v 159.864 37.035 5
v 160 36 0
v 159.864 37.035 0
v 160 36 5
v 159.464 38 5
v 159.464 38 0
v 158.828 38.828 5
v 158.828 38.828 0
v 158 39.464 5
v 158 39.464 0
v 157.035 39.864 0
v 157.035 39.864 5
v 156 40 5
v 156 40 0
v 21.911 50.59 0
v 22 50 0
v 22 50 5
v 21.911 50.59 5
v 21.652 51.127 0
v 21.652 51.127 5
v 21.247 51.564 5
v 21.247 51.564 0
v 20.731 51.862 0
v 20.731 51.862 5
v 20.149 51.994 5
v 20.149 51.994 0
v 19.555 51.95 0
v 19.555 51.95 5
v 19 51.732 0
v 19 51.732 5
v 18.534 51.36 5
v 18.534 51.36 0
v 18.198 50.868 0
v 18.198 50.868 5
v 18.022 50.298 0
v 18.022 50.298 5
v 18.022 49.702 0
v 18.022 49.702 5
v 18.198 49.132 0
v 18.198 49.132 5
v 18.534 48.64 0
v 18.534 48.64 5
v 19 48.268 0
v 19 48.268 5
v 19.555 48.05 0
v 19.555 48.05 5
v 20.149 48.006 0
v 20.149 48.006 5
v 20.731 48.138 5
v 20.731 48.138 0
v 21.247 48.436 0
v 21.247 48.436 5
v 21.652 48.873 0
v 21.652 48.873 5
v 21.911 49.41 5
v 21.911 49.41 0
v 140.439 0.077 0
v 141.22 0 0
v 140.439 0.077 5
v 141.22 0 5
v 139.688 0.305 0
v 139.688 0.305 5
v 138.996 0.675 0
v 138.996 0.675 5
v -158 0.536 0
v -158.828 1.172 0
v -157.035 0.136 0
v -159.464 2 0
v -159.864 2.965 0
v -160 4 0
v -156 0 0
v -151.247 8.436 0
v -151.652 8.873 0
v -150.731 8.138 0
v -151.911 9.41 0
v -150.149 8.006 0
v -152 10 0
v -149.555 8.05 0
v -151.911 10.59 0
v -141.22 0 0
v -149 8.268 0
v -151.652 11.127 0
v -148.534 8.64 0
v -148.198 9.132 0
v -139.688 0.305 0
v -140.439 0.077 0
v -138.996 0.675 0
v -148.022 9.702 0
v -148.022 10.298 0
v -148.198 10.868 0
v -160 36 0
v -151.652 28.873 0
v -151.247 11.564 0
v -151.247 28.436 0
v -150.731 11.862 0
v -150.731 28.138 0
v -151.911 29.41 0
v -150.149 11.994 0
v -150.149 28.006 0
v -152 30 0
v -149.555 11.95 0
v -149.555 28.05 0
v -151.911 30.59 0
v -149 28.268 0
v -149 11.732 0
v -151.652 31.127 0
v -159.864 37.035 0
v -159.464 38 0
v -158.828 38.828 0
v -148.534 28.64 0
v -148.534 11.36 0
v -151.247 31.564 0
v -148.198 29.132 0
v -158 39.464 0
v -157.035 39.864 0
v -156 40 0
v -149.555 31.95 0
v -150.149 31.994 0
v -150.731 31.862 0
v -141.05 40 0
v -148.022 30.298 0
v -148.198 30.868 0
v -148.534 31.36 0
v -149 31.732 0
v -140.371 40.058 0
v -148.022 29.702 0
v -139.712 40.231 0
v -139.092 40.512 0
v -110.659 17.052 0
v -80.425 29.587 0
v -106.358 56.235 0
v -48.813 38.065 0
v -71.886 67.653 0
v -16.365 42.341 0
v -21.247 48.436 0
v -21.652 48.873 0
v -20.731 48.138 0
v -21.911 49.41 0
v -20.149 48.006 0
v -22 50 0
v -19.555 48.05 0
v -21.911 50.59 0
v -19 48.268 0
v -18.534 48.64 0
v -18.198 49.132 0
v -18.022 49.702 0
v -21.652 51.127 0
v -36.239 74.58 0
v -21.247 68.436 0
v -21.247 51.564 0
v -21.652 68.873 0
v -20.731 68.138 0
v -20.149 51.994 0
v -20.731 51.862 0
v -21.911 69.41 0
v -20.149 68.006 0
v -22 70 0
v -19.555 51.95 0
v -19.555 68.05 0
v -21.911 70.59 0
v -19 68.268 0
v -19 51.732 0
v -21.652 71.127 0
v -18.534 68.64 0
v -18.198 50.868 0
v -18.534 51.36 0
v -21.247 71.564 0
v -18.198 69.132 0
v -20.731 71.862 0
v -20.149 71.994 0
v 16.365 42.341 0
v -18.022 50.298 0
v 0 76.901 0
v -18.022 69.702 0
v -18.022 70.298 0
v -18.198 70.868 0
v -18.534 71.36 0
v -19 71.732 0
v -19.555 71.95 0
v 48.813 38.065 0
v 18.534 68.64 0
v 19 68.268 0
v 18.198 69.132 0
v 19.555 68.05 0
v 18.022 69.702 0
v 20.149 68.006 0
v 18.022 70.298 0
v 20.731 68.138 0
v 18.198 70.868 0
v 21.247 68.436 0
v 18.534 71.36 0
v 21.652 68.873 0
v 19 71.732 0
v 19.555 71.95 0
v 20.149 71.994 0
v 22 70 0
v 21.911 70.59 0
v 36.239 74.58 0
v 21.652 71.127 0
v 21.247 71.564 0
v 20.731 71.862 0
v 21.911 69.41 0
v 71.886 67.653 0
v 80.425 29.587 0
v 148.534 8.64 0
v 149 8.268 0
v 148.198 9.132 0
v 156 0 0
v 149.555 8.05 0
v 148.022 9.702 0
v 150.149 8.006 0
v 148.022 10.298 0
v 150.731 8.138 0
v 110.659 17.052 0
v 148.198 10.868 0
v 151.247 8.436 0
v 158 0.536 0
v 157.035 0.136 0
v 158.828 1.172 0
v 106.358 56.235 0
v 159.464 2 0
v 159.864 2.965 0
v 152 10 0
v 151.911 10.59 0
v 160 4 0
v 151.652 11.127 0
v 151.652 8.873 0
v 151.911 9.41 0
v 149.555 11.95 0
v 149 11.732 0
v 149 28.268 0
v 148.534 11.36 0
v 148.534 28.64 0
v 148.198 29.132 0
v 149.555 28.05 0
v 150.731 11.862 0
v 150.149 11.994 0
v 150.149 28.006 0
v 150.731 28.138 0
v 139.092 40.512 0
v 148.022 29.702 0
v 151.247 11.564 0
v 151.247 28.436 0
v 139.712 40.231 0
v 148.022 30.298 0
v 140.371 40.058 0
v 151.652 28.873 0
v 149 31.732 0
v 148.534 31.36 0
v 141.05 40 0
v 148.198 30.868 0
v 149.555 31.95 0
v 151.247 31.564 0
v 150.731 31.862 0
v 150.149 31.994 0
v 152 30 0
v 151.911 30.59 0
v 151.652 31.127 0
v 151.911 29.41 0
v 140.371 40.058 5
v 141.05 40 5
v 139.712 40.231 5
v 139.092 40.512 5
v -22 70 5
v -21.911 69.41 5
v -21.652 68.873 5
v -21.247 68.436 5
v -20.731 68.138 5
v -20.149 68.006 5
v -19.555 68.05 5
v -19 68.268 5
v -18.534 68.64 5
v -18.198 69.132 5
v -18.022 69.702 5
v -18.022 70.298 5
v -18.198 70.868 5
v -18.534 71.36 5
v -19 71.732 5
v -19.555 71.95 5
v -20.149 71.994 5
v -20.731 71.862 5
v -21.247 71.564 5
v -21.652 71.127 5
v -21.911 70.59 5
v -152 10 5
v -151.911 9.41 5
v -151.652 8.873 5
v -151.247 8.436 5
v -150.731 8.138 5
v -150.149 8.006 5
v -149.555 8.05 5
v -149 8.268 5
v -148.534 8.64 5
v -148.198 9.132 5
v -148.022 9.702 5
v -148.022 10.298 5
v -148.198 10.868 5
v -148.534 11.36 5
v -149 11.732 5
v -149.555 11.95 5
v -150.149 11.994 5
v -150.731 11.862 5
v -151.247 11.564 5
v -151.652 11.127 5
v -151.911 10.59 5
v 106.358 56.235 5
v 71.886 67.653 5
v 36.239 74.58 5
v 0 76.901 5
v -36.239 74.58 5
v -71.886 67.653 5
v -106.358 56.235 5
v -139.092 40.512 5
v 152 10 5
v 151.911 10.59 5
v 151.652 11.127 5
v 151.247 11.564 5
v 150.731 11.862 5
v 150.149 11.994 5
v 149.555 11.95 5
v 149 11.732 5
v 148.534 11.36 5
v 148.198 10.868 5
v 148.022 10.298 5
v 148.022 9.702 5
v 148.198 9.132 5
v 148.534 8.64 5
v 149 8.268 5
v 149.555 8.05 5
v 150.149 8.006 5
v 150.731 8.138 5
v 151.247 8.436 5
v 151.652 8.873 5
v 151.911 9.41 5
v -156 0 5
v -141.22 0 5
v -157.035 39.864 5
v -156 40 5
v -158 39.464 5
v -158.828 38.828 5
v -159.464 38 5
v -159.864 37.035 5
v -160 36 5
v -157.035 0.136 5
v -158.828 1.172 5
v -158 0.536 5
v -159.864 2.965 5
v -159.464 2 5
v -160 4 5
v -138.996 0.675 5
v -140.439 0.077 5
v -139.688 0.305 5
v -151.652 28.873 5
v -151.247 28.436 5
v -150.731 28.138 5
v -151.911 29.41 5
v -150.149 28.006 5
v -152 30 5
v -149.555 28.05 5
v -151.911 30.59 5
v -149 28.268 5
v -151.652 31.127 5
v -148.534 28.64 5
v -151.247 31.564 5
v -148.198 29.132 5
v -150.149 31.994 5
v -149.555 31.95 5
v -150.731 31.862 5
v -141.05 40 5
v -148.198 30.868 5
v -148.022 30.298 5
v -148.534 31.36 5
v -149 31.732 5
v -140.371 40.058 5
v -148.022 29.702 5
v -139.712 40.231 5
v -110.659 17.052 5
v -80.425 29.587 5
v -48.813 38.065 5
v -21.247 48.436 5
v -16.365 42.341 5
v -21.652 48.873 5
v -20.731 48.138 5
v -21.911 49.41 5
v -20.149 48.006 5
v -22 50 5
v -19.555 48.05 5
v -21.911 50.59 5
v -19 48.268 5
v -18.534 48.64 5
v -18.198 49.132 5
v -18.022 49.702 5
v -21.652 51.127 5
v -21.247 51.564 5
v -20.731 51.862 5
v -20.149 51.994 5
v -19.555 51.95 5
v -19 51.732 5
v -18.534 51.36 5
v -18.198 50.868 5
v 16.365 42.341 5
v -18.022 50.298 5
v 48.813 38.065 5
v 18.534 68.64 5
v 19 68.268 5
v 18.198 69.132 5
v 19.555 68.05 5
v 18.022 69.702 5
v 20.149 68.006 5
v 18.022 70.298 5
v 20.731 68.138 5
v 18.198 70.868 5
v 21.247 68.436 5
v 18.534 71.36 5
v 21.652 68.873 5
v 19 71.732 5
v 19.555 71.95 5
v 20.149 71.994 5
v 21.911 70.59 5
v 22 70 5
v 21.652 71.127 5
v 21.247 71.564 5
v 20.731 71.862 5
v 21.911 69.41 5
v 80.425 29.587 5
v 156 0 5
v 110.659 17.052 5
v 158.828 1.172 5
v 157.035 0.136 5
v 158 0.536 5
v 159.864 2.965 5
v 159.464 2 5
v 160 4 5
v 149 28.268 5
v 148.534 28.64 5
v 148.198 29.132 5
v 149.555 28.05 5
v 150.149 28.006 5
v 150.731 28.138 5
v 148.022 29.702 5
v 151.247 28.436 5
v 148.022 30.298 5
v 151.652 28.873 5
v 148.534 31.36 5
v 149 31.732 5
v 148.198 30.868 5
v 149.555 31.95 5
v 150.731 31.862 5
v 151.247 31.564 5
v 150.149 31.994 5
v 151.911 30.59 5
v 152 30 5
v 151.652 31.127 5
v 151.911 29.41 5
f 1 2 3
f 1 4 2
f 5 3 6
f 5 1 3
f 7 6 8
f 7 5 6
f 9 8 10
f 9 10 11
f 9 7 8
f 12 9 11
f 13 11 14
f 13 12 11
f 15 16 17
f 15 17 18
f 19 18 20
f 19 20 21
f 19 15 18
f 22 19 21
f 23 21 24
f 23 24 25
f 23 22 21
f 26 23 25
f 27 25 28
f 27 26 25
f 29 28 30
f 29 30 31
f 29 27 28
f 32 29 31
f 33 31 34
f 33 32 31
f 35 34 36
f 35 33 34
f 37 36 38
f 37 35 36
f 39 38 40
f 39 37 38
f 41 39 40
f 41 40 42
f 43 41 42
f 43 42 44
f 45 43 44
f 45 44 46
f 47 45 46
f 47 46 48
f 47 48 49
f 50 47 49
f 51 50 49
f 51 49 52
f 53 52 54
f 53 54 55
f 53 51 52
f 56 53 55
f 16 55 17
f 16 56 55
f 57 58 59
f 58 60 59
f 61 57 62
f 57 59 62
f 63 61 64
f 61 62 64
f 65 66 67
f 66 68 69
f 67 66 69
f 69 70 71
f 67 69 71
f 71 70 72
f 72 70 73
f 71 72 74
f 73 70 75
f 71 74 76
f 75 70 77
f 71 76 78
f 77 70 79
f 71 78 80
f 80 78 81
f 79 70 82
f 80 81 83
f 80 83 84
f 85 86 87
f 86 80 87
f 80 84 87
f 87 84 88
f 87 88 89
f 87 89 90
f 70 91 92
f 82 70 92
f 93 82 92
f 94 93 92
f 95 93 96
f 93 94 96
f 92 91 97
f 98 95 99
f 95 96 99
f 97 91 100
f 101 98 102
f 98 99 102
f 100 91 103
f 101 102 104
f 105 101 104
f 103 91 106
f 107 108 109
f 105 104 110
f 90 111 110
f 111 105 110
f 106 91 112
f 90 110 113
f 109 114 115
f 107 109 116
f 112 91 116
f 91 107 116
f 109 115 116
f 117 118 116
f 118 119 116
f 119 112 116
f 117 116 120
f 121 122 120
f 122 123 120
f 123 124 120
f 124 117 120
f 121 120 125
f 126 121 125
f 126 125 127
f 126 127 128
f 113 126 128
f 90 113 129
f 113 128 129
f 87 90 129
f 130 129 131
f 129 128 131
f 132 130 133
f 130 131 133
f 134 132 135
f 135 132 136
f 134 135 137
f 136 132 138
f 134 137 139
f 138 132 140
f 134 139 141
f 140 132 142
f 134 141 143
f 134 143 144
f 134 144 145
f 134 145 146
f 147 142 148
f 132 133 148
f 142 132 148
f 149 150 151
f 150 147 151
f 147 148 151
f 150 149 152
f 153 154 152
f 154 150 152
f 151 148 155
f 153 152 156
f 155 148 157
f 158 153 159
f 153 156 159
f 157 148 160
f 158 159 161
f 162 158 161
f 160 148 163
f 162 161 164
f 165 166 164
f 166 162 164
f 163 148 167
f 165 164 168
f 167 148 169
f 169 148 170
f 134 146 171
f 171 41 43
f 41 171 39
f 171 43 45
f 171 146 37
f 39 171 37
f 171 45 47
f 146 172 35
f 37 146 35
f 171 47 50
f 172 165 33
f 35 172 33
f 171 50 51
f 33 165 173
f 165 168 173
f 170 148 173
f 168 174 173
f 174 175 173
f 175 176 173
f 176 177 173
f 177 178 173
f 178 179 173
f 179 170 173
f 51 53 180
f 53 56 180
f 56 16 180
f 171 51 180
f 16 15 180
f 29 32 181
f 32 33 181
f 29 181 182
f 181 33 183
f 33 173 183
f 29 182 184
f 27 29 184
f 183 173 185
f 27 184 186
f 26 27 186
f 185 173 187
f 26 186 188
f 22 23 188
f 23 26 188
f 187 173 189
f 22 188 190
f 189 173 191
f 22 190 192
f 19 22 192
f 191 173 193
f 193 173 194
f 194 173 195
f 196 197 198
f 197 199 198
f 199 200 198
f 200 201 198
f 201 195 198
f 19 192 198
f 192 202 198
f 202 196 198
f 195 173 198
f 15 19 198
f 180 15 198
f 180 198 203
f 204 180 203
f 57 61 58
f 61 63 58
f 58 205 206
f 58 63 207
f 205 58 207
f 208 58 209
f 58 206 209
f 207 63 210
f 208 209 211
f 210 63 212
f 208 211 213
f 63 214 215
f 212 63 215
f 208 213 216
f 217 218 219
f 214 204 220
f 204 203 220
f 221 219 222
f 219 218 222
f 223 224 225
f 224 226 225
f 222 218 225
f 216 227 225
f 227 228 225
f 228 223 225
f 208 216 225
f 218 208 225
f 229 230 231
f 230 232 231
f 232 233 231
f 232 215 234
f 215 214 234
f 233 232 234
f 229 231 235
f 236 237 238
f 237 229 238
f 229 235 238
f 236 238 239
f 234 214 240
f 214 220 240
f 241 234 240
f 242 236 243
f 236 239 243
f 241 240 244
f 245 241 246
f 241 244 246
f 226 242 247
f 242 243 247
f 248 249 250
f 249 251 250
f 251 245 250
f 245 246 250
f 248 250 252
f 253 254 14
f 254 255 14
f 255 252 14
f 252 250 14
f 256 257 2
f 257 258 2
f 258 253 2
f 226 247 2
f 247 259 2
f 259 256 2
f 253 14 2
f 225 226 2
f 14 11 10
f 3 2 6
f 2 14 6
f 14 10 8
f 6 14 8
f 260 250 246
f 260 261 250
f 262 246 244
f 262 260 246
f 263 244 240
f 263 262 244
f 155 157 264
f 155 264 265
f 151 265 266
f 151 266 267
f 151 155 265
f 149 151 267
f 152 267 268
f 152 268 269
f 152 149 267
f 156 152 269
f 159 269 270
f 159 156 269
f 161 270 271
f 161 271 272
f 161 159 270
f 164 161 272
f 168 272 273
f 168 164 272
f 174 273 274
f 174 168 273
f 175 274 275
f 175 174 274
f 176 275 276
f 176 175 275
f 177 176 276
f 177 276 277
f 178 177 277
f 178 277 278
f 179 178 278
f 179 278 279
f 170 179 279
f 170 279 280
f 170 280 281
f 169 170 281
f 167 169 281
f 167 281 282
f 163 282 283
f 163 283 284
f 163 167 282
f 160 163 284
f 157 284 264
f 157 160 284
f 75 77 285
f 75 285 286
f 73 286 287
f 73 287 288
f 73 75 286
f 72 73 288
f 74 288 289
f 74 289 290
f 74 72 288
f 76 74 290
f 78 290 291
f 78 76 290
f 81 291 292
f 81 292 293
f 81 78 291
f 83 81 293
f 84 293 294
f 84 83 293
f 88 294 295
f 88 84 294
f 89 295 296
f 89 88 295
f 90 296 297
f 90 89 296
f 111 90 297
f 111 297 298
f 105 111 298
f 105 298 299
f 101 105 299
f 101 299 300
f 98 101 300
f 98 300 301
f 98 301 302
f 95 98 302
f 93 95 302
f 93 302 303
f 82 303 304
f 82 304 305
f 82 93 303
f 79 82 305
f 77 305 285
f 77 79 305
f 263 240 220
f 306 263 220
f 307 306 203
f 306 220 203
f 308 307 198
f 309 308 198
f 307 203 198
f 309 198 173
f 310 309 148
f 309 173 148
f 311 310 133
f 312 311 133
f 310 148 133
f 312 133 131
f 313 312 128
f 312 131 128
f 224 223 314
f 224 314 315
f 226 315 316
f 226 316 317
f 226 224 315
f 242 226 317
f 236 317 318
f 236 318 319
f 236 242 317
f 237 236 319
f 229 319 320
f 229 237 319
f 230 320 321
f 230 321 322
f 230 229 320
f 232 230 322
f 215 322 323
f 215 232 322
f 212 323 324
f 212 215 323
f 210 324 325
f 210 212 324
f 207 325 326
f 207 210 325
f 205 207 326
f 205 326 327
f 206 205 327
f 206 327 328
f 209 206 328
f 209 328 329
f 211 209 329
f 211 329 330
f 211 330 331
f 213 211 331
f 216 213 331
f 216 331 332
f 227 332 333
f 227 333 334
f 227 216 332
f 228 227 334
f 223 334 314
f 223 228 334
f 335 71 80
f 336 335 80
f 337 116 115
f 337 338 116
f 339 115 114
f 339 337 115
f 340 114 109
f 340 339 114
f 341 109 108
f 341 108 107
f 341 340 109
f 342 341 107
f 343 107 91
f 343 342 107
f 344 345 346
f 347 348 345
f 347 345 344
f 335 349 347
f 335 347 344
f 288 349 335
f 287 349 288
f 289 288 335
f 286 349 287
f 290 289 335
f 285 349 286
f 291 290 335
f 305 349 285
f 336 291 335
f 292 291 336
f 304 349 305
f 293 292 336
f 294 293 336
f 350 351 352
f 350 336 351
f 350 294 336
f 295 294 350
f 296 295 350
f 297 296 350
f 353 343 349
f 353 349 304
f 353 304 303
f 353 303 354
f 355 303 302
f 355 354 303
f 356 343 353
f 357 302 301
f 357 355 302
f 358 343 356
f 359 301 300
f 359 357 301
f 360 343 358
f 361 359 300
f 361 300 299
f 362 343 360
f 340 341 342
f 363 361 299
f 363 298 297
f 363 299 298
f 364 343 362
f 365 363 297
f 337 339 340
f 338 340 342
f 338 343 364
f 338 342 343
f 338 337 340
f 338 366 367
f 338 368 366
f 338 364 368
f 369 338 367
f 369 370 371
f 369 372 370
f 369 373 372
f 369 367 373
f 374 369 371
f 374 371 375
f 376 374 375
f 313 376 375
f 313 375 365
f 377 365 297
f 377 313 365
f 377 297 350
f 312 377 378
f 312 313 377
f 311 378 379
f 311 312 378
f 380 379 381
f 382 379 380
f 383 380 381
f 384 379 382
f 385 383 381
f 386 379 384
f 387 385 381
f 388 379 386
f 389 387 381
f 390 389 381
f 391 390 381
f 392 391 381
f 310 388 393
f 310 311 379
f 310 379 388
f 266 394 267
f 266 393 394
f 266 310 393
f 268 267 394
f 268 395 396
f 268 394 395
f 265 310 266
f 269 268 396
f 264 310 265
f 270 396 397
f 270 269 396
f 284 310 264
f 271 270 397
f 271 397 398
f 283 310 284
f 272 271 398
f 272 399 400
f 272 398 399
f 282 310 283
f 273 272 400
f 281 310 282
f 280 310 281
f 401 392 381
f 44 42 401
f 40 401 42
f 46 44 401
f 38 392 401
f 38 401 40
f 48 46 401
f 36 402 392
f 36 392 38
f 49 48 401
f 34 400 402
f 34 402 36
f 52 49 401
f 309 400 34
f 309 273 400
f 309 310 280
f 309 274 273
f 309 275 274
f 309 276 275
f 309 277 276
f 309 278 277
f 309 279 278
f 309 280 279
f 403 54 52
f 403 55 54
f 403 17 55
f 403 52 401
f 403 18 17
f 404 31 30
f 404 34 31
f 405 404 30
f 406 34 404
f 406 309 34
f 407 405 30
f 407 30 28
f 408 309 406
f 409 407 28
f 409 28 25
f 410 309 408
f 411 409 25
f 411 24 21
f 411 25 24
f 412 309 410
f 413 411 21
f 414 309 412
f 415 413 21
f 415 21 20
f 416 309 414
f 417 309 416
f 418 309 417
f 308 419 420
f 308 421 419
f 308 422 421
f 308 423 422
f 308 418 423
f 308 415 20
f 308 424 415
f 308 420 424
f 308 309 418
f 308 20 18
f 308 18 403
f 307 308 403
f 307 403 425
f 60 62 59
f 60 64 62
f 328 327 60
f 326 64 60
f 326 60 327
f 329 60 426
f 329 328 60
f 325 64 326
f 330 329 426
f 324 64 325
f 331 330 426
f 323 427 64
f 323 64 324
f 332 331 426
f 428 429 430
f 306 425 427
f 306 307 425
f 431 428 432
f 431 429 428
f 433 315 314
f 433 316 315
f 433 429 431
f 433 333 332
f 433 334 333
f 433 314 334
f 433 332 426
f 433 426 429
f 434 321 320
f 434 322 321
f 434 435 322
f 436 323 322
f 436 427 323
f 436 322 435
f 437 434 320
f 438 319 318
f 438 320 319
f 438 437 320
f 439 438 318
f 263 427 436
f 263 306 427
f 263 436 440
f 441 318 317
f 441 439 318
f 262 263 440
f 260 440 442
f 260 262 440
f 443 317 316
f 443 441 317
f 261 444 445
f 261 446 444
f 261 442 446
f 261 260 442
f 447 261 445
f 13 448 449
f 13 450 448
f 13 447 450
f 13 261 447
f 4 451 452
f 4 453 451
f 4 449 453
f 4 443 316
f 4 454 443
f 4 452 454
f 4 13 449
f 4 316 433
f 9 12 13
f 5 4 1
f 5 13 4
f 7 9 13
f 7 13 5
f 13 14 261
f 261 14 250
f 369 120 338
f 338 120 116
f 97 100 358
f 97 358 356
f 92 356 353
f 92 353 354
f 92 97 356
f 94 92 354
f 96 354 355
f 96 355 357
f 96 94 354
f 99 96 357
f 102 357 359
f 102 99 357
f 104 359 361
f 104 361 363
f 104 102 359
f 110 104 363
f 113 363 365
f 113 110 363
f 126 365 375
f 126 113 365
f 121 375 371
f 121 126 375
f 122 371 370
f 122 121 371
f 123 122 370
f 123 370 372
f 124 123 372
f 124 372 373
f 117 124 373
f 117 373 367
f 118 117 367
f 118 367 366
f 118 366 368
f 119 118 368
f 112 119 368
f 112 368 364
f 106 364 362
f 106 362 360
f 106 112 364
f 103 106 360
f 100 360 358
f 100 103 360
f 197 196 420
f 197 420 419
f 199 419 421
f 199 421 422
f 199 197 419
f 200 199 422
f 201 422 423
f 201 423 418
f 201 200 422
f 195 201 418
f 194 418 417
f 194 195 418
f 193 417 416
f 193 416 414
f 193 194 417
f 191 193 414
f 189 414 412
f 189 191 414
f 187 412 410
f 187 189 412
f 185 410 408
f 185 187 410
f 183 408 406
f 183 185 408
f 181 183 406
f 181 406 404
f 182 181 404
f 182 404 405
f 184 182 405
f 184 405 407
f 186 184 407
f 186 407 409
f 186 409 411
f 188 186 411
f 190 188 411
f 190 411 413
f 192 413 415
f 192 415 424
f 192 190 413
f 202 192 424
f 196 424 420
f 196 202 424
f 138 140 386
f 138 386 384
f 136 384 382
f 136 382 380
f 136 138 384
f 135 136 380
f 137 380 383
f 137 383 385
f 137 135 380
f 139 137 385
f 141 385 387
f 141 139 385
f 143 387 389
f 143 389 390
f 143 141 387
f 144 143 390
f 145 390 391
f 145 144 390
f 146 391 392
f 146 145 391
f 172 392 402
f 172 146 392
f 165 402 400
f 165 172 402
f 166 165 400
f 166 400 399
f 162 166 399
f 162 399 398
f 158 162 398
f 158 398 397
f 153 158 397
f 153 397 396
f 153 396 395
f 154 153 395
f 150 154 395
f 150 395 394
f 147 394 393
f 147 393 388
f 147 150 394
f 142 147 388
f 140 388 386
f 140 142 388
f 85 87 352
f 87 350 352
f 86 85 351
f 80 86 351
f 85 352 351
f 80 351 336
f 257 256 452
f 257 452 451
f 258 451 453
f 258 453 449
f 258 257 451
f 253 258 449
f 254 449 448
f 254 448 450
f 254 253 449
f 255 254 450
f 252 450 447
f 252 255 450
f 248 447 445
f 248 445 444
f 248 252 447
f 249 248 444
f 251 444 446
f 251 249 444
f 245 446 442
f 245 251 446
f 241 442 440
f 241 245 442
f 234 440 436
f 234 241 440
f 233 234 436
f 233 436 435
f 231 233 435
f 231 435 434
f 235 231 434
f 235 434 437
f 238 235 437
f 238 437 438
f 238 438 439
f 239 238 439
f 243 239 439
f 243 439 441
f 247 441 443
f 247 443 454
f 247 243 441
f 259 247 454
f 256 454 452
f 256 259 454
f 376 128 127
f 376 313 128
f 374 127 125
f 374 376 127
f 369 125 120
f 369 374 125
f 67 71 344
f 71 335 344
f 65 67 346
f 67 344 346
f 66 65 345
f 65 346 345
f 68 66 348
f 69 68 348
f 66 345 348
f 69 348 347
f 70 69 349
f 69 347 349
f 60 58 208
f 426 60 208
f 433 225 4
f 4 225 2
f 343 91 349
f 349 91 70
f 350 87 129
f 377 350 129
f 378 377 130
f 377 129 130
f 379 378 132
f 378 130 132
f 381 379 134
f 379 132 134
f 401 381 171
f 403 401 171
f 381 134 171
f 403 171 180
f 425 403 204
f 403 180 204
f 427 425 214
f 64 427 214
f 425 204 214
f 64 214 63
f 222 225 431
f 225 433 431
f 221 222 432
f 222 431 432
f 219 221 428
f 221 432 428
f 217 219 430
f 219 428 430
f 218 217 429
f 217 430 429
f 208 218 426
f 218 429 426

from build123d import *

# Parameters (mm, degrees)
ESQUISSE1_R        = 2
BOSS_EXTRU_1_DEPTH = 5
CONG_1_R           = 4


with BuildPart() as part:
    # Esquisse1 → Boss.-Extru.1 (new body)
    with BuildSketch(Plane.XY):
        with BuildLine():
            Line((160, 0), (160, 40))
            Line((160, 40), (140, 40))
            ThreePointArc((140, 40), (0, 76.901234754), (-140, 40))
            Line((-140, 40), (-160, 40))
            Line((-160, 40), (-160, 0))
            Line((-160, 0), (-140, 0))
            ThreePointArc((-140, 0), (0, 42.876848228), (140, 0))
            Line((140, 0), (160, 0))
        make_face()
        with Locations((20, 70)):
            Circle(ESQUISSE1_R, mode=Mode.SUBTRACT)
        with Locations((20, 50)):
            Circle(ESQUISSE1_R, mode=Mode.SUBTRACT)
        with Locations(Location((-20, 50, 0), (0, 0, 180))):
            Circle(ESQUISSE1_R, mode=Mode.SUBTRACT)
        with Locations(Location((-20, 70, 0), (0, 0, 180))):
            Circle(ESQUISSE1_R, mode=Mode.SUBTRACT)
        with Locations((150, 30)):
            Circle(ESQUISSE1_R, mode=Mode.SUBTRACT)
        with Locations((150, 10)):
            Circle(ESQUISSE1_R, mode=Mode.SUBTRACT)
        with Locations(Location((-150, 10, 0), (0, 0, 180))):
            Circle(ESQUISSE1_R, mode=Mode.SUBTRACT)
        with Locations(Location((-150, 30, 0), (0, 0, 180))):
            Circle(ESQUISSE1_R, mode=Mode.SUBTRACT)
    extrude(amount=BOSS_EXTRU_1_DEPTH)

    # Congé1
    cong_1_edges = [part.edges().sort_by_distance(p)[0] for p in [
        (-140, 0, 2.5),
        (-160, 0, 2.5),
        (-160, 40, 2.5),
        (-140, 40, 2.5),
        (140, 40, 2.5),
        (160, 40, 2.5),
        (160, 0, 2.5),
        (140, 0, 2.5),
    ]]
    fillet(cong_1_edges, radius=CONG_1_R)


solid = part.part
